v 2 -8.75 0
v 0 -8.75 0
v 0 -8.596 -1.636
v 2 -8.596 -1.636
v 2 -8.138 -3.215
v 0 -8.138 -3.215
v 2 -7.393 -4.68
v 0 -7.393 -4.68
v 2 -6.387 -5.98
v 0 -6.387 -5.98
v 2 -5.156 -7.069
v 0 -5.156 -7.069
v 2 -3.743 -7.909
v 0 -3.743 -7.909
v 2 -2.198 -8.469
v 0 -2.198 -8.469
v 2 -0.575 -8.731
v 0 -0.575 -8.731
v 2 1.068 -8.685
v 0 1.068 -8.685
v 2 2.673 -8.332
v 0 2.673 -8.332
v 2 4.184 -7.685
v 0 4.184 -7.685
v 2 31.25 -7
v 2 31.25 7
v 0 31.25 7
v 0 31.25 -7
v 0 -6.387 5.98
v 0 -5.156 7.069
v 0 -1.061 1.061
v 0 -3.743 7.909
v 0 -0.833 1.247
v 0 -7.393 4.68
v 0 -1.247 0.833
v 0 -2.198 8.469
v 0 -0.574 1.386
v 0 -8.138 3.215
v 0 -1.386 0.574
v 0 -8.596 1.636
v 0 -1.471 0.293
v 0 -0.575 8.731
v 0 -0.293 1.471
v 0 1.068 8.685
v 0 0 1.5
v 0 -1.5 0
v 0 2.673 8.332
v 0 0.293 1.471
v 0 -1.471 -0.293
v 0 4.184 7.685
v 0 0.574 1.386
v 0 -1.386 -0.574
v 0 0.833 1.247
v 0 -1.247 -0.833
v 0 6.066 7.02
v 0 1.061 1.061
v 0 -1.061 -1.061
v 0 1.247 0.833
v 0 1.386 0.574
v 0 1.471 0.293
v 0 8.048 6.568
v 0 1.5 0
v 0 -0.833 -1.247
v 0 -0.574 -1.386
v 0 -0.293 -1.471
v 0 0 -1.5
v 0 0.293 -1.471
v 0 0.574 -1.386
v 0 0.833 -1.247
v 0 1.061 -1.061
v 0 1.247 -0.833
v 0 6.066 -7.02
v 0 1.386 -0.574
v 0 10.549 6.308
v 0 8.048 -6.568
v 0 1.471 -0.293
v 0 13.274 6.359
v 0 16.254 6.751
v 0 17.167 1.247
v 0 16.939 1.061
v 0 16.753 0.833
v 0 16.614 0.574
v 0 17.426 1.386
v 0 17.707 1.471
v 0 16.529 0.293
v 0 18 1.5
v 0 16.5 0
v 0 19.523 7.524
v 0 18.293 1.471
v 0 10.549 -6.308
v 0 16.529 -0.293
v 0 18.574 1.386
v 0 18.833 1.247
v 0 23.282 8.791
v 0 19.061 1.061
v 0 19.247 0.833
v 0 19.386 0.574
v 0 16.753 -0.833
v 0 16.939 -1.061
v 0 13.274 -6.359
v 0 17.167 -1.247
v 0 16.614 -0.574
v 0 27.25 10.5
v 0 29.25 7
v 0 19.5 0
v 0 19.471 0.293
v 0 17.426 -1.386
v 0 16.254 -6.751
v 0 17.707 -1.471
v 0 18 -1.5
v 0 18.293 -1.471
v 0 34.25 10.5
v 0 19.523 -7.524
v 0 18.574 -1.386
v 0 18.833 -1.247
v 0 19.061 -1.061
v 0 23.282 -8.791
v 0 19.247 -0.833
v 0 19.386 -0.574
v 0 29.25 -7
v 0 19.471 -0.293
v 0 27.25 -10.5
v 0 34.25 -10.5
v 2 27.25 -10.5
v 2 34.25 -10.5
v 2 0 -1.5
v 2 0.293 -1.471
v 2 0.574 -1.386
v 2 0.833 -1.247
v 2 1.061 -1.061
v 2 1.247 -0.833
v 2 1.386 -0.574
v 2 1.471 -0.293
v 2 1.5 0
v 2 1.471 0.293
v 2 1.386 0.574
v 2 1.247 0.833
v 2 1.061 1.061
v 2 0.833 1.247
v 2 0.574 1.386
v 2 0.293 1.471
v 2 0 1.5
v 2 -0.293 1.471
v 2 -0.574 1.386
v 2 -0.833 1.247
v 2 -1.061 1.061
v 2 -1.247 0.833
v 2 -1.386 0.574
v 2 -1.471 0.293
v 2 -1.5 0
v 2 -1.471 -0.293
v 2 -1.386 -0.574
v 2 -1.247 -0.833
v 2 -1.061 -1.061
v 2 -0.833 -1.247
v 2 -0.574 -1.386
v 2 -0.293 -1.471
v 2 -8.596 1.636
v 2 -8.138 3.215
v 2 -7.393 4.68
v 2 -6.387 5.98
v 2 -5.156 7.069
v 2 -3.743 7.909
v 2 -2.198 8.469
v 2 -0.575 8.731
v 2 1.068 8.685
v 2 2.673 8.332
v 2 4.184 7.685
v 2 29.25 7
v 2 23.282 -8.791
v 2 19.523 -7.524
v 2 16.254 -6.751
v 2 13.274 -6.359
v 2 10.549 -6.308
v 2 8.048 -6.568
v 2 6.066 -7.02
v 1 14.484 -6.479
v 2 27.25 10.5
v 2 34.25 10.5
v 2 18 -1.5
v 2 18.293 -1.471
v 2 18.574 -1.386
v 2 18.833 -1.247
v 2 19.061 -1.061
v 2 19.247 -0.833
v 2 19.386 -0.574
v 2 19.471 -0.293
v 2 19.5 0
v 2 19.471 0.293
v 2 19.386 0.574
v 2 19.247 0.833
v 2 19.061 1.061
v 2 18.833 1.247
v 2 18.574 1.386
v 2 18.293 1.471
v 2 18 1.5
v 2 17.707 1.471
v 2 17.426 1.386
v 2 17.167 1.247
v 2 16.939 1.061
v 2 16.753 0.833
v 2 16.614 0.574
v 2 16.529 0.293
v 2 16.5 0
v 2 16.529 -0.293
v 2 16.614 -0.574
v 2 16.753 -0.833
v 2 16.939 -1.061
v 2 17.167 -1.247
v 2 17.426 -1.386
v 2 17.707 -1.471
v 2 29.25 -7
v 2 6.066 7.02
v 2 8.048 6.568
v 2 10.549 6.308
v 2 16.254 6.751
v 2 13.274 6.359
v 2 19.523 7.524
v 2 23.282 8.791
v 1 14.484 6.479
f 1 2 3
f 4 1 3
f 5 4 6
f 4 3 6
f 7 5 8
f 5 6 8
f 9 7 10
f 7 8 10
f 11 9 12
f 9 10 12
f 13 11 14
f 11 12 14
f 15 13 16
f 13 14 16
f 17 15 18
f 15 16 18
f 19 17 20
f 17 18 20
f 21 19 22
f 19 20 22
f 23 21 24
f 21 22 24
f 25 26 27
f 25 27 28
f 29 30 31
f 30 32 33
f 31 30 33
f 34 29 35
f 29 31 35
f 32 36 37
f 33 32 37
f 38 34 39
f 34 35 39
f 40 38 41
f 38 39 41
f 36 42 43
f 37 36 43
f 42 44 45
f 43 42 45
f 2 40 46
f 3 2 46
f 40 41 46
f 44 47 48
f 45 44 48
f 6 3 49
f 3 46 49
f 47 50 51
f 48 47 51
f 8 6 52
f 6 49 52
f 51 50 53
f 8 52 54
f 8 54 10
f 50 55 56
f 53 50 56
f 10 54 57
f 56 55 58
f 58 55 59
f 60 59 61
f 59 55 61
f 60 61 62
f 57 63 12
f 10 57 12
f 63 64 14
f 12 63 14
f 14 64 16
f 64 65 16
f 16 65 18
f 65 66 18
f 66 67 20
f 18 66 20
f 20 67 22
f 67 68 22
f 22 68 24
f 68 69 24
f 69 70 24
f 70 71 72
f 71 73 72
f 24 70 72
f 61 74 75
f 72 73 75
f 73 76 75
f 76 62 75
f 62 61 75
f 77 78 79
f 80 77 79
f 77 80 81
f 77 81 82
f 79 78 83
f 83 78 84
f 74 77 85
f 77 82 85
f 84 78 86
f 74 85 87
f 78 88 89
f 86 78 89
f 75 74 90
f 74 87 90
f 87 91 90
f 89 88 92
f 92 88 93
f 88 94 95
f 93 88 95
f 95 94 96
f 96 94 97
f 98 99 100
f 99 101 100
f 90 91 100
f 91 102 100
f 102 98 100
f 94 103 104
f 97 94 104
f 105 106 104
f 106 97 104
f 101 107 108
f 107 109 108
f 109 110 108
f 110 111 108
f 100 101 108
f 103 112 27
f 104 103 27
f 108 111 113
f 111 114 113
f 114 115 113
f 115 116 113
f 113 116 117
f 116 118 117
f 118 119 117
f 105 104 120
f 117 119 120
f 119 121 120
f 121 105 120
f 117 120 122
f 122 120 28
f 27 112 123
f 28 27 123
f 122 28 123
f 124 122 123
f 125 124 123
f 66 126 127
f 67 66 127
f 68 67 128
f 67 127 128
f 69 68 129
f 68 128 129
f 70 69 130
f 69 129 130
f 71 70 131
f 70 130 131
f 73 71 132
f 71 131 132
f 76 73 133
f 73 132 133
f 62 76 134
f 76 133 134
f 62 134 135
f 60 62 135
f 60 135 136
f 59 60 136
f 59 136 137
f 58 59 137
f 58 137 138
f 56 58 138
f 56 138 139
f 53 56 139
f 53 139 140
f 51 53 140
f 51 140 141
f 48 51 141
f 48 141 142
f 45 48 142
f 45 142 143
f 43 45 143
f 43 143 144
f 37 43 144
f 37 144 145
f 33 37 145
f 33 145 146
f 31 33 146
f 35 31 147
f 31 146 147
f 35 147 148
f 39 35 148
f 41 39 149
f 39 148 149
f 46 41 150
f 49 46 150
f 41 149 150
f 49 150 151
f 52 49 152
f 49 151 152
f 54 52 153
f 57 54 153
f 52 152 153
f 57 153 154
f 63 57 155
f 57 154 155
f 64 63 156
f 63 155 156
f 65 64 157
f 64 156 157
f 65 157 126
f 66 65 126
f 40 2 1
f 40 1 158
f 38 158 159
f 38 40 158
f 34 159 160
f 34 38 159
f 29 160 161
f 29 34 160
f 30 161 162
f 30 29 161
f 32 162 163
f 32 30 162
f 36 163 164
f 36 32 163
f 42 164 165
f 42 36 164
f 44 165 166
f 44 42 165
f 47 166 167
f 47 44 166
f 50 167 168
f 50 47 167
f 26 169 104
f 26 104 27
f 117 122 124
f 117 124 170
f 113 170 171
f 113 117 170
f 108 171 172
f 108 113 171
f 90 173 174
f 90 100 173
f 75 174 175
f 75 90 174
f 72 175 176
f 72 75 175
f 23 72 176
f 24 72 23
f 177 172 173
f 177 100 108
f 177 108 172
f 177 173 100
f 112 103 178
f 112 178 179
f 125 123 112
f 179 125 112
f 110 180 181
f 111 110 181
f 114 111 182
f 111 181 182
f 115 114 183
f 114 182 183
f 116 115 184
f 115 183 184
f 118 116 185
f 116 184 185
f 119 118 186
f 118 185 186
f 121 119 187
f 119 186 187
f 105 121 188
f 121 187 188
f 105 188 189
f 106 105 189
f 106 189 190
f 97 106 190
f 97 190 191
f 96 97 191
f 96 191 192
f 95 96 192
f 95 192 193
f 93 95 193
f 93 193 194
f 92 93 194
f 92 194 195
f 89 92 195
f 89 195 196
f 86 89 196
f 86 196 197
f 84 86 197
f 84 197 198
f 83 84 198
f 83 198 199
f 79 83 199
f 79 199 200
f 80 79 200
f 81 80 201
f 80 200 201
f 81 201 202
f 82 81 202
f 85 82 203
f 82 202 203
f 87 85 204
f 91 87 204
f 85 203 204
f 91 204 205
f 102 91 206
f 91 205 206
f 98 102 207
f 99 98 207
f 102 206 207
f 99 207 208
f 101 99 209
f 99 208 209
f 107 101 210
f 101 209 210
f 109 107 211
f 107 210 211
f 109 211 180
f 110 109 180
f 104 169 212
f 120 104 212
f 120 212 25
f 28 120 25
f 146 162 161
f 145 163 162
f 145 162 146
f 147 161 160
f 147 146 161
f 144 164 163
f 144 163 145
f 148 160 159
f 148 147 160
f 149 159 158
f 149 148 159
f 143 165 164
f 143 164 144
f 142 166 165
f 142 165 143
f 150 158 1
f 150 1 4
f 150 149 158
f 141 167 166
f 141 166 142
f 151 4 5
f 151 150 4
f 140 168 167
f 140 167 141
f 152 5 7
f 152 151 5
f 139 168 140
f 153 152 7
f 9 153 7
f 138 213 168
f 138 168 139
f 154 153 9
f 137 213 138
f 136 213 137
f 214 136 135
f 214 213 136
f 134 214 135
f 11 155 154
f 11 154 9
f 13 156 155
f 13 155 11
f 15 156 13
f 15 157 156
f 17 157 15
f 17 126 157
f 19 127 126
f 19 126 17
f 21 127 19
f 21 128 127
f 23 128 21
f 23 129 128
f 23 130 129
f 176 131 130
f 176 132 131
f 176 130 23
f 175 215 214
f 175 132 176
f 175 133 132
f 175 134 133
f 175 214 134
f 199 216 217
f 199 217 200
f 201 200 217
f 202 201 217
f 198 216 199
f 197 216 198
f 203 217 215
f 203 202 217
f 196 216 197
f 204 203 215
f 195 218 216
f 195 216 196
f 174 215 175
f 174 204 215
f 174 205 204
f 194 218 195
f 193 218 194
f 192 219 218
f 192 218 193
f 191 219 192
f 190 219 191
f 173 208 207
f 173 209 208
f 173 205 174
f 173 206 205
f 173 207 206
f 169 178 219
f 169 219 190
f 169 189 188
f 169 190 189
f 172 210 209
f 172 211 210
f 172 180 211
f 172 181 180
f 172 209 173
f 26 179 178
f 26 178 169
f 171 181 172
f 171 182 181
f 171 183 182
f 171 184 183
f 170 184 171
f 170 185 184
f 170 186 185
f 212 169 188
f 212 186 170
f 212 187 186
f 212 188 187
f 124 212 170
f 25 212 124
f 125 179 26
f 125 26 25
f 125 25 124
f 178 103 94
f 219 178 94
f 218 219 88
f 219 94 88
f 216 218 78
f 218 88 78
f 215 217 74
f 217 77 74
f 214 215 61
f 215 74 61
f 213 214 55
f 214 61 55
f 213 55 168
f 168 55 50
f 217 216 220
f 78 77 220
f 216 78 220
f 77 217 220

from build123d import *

# Parameters (mm, degrees)
RESSALTO_EXTRUS_O1_DEPTH = 2
ESBO_O2_R                = 1.5
ESBO_O2_W                = 14
ESBO_O2_H                = 2
CORTE_EXTRUS_O1_DEPTH    = 3.0000001


with BuildPart() as part:
    # Esboço1 → Ressalto-extrusão1 (new body)
    with BuildSketch(Plane(origin=(0, 0, 0), x_dir=(0, 0, -1), z_dir=(1, 0, 0))):
        with BuildLine():
            Line((-10.5, 34.25), (0, 34.25))
            Line((0, 34.25), (0, -8.75))
            ThreePointArc((0, -8.75), (-7.522394047, -4.46946169), (-7.684811888, 4.184037075))
            add(Edge.make_bspline(
                [(-10.5, 27.25), (-3.865048066, 13.251366251), (-7.684811888, 4.184037075)],
                knots=[0, 0, 0, 0.912495845, 0.912495845, 0.912495845], degree=2))
            Line((-10.5, 27.25), (-10.5, 34.25))
        make_face()
    ressalto_extrus_o1 = extrude(amount=RESSALTO_EXTRUS_O1_DEPTH)

    # Espelhar1: Ressalto-extrusão1 across plane
    add(ressalto_extrus_o1.mirror(Plane(origin=(2, 34.25, 0), x_dir=(1, 0, 0), z_dir=(0, 0, 1))))

    # Esboço2 → Corte-extrusão1 (cut, through all)
    with BuildSketch(Plane(origin=(2, 0, 0), x_dir=(0, 0, -1), z_dir=(1, 0, 0))):
        with Locations((0, 18)):
            Circle(ESBO_O2_R)
        Circle(ESBO_O2_R)
        with Locations((0, 30.25)):
            Rectangle(ESBO_O2_W, ESBO_O2_H)
    extrude(amount=-CORTE_EXTRUS_O1_DEPTH, mode=Mode.SUBTRACT)


solid = part.part
